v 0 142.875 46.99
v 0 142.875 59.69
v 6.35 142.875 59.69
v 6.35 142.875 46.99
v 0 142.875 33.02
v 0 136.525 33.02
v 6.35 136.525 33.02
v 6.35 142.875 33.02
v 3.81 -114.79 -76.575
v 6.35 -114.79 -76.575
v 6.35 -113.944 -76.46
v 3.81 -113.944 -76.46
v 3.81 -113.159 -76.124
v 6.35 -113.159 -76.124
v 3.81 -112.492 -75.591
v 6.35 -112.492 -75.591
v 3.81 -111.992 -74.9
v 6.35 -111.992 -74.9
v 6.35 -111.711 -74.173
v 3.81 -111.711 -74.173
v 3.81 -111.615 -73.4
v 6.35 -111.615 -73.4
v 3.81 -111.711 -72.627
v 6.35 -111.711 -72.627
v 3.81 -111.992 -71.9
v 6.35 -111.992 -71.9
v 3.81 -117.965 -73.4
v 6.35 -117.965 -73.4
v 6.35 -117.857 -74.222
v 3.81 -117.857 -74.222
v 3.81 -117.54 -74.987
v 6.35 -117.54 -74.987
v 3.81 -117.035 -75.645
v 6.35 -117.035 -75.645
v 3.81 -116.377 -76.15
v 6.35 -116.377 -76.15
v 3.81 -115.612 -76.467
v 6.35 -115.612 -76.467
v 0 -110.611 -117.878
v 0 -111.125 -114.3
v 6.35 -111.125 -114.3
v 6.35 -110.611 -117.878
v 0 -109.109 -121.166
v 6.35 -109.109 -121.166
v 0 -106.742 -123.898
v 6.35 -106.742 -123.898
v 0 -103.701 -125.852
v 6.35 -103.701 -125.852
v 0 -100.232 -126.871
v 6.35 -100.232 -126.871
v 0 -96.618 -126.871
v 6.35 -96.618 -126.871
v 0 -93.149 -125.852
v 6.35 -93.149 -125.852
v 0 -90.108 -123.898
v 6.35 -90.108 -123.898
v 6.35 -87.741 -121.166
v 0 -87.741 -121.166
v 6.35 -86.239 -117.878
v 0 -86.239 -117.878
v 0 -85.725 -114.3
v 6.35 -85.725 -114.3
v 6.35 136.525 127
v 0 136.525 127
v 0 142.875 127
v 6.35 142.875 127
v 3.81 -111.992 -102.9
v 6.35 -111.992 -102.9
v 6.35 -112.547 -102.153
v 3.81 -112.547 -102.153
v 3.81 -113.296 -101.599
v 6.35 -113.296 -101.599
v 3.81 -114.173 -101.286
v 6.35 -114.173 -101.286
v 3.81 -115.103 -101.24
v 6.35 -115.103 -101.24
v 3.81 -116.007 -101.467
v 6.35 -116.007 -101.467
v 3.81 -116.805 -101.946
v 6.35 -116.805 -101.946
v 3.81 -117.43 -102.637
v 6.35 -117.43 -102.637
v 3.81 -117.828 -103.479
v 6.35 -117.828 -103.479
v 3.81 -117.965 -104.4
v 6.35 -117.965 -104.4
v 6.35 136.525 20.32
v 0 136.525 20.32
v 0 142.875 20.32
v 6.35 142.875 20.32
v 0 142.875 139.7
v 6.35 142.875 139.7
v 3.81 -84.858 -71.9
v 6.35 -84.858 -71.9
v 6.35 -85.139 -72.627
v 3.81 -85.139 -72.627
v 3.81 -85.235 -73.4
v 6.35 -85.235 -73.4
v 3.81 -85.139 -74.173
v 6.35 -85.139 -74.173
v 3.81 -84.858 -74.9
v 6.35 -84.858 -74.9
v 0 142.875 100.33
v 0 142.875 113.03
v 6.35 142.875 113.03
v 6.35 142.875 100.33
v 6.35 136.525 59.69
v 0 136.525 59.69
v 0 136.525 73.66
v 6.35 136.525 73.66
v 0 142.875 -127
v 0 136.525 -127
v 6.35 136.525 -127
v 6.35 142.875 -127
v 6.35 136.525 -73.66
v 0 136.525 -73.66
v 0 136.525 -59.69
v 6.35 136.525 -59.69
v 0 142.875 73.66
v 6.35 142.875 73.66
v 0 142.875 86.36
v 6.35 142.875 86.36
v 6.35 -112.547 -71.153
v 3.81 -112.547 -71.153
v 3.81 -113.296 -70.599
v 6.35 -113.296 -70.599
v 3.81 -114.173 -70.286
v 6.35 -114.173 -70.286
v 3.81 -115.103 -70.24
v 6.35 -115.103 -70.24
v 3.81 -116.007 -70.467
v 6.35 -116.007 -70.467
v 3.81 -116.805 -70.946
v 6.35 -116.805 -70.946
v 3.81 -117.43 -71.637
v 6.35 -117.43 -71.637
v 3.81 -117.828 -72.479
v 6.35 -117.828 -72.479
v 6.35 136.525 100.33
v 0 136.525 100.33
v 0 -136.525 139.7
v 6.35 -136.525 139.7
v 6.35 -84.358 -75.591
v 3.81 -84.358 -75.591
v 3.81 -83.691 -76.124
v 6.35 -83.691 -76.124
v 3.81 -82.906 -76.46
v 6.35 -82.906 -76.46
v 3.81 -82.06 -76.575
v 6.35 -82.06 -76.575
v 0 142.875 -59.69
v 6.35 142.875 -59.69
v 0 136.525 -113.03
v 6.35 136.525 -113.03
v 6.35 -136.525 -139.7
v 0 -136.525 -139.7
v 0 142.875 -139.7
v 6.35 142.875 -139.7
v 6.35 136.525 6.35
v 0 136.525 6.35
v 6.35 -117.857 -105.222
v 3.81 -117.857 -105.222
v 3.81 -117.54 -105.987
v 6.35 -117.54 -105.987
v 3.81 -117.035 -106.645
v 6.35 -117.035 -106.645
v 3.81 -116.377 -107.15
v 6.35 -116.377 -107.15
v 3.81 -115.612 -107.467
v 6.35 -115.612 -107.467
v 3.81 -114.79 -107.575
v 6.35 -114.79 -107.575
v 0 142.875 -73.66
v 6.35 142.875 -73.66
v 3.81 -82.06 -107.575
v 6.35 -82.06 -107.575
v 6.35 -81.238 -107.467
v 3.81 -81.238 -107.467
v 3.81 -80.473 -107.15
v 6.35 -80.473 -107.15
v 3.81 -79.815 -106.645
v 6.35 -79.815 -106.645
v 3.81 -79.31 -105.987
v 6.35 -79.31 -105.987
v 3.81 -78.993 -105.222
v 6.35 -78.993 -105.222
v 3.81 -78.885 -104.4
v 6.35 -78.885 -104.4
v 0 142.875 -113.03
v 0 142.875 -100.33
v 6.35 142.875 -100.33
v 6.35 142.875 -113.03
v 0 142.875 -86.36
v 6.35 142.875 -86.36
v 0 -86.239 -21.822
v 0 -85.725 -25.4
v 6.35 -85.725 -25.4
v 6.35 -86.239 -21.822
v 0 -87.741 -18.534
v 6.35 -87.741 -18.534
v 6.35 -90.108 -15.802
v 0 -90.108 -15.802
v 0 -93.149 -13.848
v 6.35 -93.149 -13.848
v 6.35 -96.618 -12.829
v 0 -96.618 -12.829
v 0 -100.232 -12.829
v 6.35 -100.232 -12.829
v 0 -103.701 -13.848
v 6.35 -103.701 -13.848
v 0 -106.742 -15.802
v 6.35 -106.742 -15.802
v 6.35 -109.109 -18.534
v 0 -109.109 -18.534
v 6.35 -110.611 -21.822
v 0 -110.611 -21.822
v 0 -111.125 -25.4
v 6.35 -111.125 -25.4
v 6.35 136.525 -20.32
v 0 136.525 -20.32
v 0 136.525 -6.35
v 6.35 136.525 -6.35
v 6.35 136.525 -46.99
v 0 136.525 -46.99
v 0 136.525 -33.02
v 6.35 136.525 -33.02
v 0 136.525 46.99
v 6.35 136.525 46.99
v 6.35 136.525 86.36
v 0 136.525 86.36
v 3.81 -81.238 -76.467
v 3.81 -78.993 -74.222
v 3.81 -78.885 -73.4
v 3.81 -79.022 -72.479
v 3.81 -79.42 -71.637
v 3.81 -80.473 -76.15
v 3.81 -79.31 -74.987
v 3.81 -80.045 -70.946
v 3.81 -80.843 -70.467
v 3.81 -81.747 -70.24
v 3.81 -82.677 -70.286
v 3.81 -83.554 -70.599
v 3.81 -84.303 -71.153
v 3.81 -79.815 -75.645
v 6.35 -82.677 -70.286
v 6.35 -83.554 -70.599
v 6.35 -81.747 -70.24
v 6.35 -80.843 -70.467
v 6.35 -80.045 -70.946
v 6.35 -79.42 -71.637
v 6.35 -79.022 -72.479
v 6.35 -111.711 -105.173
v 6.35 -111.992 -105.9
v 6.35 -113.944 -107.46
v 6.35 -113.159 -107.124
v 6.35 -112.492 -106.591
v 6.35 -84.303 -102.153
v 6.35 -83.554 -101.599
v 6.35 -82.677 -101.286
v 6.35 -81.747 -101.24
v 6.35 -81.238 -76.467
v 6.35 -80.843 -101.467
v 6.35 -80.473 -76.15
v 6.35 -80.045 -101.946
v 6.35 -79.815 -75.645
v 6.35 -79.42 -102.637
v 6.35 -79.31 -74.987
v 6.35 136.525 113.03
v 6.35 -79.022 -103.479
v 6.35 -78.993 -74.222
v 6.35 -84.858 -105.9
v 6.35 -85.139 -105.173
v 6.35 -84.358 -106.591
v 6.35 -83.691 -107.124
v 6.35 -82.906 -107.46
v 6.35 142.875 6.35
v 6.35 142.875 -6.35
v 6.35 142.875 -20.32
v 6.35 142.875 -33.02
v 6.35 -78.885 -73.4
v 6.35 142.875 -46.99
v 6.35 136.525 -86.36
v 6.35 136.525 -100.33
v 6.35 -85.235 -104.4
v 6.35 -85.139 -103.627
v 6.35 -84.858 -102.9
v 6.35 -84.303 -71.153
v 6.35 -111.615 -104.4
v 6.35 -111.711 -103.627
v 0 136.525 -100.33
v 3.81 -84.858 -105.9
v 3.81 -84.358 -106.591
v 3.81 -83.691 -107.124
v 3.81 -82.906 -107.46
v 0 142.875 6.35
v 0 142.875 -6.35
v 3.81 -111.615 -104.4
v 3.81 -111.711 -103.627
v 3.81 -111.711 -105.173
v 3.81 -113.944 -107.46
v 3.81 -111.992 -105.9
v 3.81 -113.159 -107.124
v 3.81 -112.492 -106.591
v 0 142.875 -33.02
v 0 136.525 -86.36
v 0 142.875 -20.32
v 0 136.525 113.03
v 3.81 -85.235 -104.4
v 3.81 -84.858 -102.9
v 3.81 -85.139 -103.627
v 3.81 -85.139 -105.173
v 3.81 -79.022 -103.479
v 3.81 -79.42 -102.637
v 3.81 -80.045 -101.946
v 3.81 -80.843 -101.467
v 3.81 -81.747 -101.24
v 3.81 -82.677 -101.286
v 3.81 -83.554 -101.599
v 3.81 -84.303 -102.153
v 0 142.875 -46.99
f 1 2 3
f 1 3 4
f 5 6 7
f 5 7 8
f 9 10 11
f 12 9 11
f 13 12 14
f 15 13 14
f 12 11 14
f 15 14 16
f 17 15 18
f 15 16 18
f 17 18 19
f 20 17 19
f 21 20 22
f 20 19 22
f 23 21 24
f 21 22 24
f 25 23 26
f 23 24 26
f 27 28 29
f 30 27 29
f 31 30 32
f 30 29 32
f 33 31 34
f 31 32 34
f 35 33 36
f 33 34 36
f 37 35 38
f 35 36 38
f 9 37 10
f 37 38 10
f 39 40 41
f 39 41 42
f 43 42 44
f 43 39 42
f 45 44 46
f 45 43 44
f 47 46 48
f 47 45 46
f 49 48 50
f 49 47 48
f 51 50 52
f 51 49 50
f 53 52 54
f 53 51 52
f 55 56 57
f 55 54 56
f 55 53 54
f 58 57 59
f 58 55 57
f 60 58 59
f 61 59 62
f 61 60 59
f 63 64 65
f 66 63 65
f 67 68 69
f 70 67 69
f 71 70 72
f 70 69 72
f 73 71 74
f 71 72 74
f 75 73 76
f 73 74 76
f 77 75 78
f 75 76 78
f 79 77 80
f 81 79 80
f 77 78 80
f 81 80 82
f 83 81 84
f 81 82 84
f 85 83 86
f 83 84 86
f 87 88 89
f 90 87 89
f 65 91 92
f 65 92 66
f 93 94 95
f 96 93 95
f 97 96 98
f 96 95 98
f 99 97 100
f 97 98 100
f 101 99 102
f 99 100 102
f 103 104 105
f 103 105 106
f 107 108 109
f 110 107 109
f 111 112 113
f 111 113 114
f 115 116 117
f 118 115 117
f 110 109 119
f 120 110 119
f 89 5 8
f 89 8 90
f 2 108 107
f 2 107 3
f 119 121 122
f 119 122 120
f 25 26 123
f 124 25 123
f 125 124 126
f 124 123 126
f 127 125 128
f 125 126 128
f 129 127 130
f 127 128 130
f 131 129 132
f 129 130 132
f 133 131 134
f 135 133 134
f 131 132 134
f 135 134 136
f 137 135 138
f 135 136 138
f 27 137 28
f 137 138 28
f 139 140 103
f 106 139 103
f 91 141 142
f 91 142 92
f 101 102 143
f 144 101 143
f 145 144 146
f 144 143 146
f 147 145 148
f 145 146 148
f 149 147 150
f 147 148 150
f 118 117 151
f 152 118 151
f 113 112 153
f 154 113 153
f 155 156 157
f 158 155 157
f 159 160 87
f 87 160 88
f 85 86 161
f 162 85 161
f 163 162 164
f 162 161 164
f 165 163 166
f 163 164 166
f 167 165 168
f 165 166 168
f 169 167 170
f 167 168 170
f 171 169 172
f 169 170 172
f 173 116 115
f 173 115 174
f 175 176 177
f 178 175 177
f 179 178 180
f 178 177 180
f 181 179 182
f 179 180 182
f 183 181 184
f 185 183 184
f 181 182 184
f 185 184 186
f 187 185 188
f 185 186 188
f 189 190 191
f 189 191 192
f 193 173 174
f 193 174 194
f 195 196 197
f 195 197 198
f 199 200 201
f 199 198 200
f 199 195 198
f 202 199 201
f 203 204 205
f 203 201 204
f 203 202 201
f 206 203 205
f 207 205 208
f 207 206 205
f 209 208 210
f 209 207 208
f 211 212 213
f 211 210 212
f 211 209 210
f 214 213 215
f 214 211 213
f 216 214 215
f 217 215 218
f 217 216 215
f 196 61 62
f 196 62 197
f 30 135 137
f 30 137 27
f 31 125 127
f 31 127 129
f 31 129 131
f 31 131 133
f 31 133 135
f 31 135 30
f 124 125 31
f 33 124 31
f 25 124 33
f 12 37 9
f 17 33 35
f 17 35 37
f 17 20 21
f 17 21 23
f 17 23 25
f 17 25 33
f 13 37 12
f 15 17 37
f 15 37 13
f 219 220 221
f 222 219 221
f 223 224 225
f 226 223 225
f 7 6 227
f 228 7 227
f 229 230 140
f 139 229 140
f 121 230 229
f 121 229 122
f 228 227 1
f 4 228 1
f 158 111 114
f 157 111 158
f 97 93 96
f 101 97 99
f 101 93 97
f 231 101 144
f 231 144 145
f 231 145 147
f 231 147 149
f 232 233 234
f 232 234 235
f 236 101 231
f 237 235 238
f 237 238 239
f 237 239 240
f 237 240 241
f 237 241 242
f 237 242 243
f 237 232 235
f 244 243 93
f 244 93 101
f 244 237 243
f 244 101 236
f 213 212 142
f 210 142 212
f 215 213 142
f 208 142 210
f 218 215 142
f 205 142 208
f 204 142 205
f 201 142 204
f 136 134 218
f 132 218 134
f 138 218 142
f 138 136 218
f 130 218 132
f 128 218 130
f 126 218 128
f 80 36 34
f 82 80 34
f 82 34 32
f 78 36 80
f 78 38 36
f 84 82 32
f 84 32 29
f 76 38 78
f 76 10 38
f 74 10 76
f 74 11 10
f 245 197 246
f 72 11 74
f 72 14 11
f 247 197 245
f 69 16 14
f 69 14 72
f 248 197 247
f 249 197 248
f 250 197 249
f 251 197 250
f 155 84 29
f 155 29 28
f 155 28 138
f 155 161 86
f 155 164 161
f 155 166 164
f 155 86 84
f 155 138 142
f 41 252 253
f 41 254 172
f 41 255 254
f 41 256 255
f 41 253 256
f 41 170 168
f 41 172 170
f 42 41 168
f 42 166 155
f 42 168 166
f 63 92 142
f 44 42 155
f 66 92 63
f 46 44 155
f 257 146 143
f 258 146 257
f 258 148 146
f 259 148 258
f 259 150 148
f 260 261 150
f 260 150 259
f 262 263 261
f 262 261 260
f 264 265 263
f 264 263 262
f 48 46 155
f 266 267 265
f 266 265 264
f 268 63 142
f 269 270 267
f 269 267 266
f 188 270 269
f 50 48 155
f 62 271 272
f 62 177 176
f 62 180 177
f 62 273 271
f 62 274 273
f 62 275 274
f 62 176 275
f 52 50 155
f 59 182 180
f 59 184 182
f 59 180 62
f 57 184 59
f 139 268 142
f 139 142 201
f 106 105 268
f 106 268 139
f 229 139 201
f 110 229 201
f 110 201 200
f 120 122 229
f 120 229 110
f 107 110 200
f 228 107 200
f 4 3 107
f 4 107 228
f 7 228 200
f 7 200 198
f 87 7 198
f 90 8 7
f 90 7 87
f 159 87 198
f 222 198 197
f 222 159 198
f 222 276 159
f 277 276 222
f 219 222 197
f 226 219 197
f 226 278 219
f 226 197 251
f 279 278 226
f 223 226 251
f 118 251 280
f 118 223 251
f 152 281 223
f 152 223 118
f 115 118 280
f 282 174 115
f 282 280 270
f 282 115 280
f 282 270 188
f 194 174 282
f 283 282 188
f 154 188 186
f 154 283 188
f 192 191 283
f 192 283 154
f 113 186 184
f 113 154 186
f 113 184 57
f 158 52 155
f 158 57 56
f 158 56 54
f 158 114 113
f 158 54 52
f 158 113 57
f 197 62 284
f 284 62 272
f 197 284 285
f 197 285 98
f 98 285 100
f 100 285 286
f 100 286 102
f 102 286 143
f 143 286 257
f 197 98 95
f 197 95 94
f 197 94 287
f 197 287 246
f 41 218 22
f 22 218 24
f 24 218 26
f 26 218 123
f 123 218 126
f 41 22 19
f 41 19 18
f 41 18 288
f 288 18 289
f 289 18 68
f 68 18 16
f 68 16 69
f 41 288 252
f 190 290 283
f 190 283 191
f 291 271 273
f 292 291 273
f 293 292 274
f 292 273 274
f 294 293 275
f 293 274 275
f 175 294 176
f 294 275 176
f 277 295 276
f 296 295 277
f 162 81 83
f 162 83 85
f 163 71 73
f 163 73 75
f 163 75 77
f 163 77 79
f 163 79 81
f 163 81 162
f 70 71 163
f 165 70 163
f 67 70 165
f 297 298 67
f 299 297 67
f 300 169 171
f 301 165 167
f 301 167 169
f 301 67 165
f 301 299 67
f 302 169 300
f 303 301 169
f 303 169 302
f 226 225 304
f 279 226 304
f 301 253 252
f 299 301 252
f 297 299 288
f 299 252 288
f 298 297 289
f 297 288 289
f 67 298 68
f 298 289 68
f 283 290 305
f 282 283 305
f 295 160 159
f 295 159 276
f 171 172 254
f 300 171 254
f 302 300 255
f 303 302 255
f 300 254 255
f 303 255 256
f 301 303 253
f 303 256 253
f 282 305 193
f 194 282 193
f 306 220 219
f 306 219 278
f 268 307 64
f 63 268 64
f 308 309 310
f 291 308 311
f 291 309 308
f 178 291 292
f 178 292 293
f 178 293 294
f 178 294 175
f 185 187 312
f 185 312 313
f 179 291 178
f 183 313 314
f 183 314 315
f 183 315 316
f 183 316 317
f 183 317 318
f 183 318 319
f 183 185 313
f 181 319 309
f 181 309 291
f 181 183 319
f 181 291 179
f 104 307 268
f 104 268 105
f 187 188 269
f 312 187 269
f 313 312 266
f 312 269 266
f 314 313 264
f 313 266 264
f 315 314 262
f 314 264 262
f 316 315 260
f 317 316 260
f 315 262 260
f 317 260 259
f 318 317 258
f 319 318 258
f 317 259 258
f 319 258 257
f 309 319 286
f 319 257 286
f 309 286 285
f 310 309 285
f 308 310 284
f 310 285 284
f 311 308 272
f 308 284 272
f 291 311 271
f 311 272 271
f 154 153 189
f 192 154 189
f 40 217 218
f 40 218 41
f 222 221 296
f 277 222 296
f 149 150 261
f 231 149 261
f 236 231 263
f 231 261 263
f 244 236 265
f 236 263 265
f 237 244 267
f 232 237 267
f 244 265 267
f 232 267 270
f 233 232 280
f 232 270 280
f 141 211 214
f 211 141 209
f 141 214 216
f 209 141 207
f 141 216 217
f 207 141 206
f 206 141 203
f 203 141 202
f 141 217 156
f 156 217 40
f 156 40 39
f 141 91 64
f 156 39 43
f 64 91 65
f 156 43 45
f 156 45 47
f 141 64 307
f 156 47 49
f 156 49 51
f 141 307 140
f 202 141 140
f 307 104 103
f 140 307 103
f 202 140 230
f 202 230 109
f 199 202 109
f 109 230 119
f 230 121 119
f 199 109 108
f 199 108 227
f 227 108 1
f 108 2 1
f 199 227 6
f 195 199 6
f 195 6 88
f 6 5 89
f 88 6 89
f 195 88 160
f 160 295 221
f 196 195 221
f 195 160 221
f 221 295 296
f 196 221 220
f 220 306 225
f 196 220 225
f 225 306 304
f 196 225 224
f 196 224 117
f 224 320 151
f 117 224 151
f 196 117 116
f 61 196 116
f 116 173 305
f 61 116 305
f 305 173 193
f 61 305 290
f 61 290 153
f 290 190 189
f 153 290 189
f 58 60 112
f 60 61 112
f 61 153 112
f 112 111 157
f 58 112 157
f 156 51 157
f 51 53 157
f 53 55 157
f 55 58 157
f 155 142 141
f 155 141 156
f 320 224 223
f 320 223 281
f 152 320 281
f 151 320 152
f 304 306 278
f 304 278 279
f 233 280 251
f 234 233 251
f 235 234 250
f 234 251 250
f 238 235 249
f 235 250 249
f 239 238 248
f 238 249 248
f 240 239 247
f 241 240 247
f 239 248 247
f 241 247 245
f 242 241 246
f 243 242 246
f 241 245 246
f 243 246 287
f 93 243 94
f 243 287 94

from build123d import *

# Parameters (mm, degrees)
SKETCH1_W           = 279.4
SKETCH1_H           = 285.75
BOSS_EXTRUDE1_DEPTH = 6.35
SKETCH2_W           = 279.4
SKETCH2_H           = 6.35
BOSS_EXTRUDE2_DEPTH = 12.7
CUT_EXTRUDE1_DEPTH  = 20.05
SKETCH5_W           = 51.415141408
SKETCH5_H           = 21.159166417
CUT_EXTRUDE2_DEPTH  = 280.4
SKETCH4_W           = 13.97
SKETCH4_H           = 6.35
CUT_EXTRUDE3_DEPTH  = 6.35
CUT_EXTRUDE5_DEPTH  = 2.54
SKETCH7_W           = 279.4
SKETCH7_H           = 6.35
CUT_EXTRUDE6_DEPTH  = 7.35


with BuildPart() as part:
    # Sketch1 → Boss-Extrude1 (new body)
    with BuildSketch(Plane(origin=(0, 0, 0), x_dir=(0, 0, -1), z_dir=(1, 0, 0))):
        Rectangle(SKETCH1_W, SKETCH1_H)
    extrude(amount=BOSS_EXTRUDE1_DEPTH)

    # Sketch2 → Boss-Extrude2 (add)
    with BuildSketch(Plane(origin=(6.35, 0, 0), x_dir=(0, 0, -1), z_dir=(1, 0, 0))):
        with Locations((0, 139.7)):
            Rectangle(SKETCH2_W, SKETCH2_H)
    extrude(amount=BOSS_EXTRUDE2_DEPTH)

    # Sketch3 → Cut-Extrude1 (cut, through all)
    with BuildSketch(Plane.ZY):
        with BuildLine():
            Line((-114.3, -85.725), (-25.4, -85.725))
            ThreePointArc((-25.4, -85.725), (-12.7, -98.425), (-25.4, -111.125))
            Line((-25.4, -111.125), (-114.3, -111.125))
            ThreePointArc((-114.3, -111.125), (-127, -98.425), (-114.3, -85.725))
        make_face()
    extrude(amount=-CUT_EXTRUDE1_DEPTH, mode=Mode.SUBTRACT)

    # Sketch5 → Cut-Extrude2 (cut, through all)
    with BuildSketch(Plane(origin=(0, 0, -139.7), x_dir=(-1, 0, 0), z_dir=(0, 0, -1))):
        with Locations((-32.057570704, 147.104583209)):
            Rectangle(SKETCH5_W, SKETCH5_H)
    extrude(amount=-CUT_EXTRUDE2_DEPTH, mode=Mode.SUBTRACT)

    # Sketch4 → Cut-Extrude3 (cut)
    with BuildSketch(Plane.ZY):
        with Locations((-120.015, 139.7)):
            Rectangle(SKETCH4_W, SKETCH4_H)
        with Locations((-93.345, 139.7)):
            Rectangle(SKETCH4_W, SKETCH4_H)
        with Locations((-66.675, 139.7)):
            Rectangle(SKETCH4_W, SKETCH4_H)
        with Locations((-40.005, 139.7)):
            Rectangle(SKETCH4_W, SKETCH4_H)
        with Locations((-13.335, 139.7)):
            Rectangle(SKETCH4_W, SKETCH4_H)
        with Locations((13.335, 139.7)):
            Rectangle(SKETCH4_W, SKETCH4_H)
        with Locations((40.005, 139.7)):
            Rectangle(SKETCH4_W, SKETCH4_H)
        with Locations((66.675, 139.7)):
            Rectangle(SKETCH4_W, SKETCH4_H)
        with Locations((93.345, 139.7)):
            Rectangle(SKETCH4_W, SKETCH4_H)
        with Locations((120.015, 139.7)):
            Rectangle(SKETCH4_W, SKETCH4_H)
    extrude(amount=-CUT_EXTRUDE3_DEPTH, mode=Mode.SUBTRACT)

    # Sketch6 → Cut-Extrude5 (cut)
    with BuildSketch(Plane(origin=(6.35, 0, 0), x_dir=(0, 0, -1), z_dir=(1, 0, 0))):
        with BuildLine():
            ThreePointArc((76.575, -82.06), (75.64506403, -79.81493597), (73.4, -78.885))
            ThreePointArc((73.4, -78.885), (74.460660172, -79.324339828), (74.9, -80.385))
            Line((74.9, -80.385), (74.9, -84.858325392))
            ThreePointArc((74.9, -84.858325392), (76.124254485, -83.690663209), (76.575, -82.06))
        make_face()
        with BuildLine():
            Line((71.9, -80.385), (71.9, -84.858325392))
            ThreePointArc((71.9, -84.858325392), (73.4, -85.235), (74.9, -84.858325392))
            Line((74.9, -84.858325392), (74.9, -80.385))
            ThreePointArc((74.9, -80.385), (74.460660172, -79.324339828), (73.4, -78.885))
            ThreePointArc((73.4, -78.885), (72.339339828, -79.324339828), (71.9, -80.385))
        make_face()
        with BuildLine():
            ThreePointArc((73.4, -78.885), (70.320608167, -81.286714193), (71.9, -84.858325392))
            Line((71.9, -84.858325392), (71.9, -80.385))
            ThreePointArc((71.9, -80.385), (72.339339828, -79.324339828), (73.4, -78.885))
        make_face()
        with BuildLine():
            Line((102.9, -80.385), (102.9, -84.858325392))
            ThreePointArc((102.9, -84.858325392), (104.4, -85.235), (105.9, -84.858325392))
            Line((105.9, -84.858325392), (105.9, -80.385))
            ThreePointArc((105.9, -80.385), (105.460660172, -79.324339828), (104.4, -78.885))
            ThreePointArc((104.4, -78.885), (103.339339828, -79.324339828), (102.9, -80.385))
        make_face()
        with BuildLine():
            ThreePointArc((104.4, -78.885), (101.320608167, -81.286714193), (102.9, -84.858325392))
            Line((102.9, -84.858325392), (102.9, -80.385))
            ThreePointArc((102.9, -80.385), (103.339339828, -79.324339828), (104.4, -78.885))
        make_face()
        with BuildLine():
            ThreePointArc((107.575, -82.06), (106.64506403, -79.81493597), (104.4, -78.885))
            ThreePointArc((104.4, -78.885), (105.460660172, -79.324339828), (105.9, -80.385))
            Line((105.9, -80.385), (105.9, -84.858325392))
            ThreePointArc((105.9, -84.858325392), (107.124254485, -83.690663209), (107.575, -82.06))
        make_face()
        with BuildLine():
            ThreePointArc((74.9, -116.465), (74.460660172, -117.525660172), (73.4, -117.965))
            ThreePointArc((73.4, -117.965), (75.64506403, -117.03506403), (76.575, -114.79))
            ThreePointArc((76.575, -114.79), (76.124254485, -113.159336791), (74.9, -111.991674608))
            Line((74.9, -111.991674608), (74.9, -116.465))
        make_face()
        with BuildLine():
            Line((71.9, -111.991674608), (71.9, -116.465))
            ThreePointArc((71.9, -116.465), (72.339339828, -117.525660172), (73.4, -117.965))
            ThreePointArc((73.4, -117.965), (74.460660172, -117.525660172), (74.9, -116.465))
            Line((74.9, -116.465), (74.9, -111.991674608))
            ThreePointArc((74.9, -111.991674608), (73.4, -111.615), (71.9, -111.991674608))
        make_face()
        with BuildLine():
            ThreePointArc((73.4, -117.965), (72.339339828, -117.525660172), (71.9, -116.465))
            Line((71.9, -116.465), (71.9, -111.991674608))
            ThreePointArc((71.9, -111.991674608), (70.320608167, -115.563285807), (73.4, -117.965))
        make_face()
        with BuildLine():
            ThreePointArc((104.4, -117.965), (105.460660172, -117.525660172), (105.9, -116.465))
            Line((105.9, -116.465), (105.9, -111.991674608))
            ThreePointArc((105.9, -111.991674608), (104.4, -111.615), (102.9, -111.991674608))
            Line((102.9, -111.991674608), (102.9, -116.465))
            ThreePointArc((102.9, -116.465), (103.339339828, -117.525660172), (104.4, -117.965))
        make_face()
        with BuildLine():
            Line((105.9, -111.991674608), (105.9, -116.465))
            ThreePointArc((105.9, -116.465), (105.460660172, -117.525660172), (104.4, -117.965))
            ThreePointArc((104.4, -117.965), (106.64506403, -117.03506403), (107.575, -114.79))
            ThreePointArc((107.575, -114.79), (107.124254485, -113.159336791), (105.9, -111.991674608))
        make_face()
        with BuildLine():
            ThreePointArc((102.9, -111.991674608), (101.320608167, -115.563285807), (104.4, -117.965))
            ThreePointArc((104.4, -117.965), (103.339339828, -117.525660172), (102.9, -116.465))
            Line((102.9, -116.465), (102.9, -111.991674608))
        make_face()
    extrude(amount=-CUT_EXTRUDE5_DEPTH, mode=Mode.SUBTRACT)

    # Sketch7 → Cut-Extrude6 (cut, through all)
    with BuildSketch(Plane(origin=(6.35, 0, 0), x_dir=(0, 0, -1), z_dir=(1, 0, 0))):
        with Locations((0, -139.7)):
            Rectangle(SKETCH7_W, SKETCH7_H)
    extrude(amount=-CUT_EXTRUDE6_DEPTH, mode=Mode.SUBTRACT)


solid = part.part
